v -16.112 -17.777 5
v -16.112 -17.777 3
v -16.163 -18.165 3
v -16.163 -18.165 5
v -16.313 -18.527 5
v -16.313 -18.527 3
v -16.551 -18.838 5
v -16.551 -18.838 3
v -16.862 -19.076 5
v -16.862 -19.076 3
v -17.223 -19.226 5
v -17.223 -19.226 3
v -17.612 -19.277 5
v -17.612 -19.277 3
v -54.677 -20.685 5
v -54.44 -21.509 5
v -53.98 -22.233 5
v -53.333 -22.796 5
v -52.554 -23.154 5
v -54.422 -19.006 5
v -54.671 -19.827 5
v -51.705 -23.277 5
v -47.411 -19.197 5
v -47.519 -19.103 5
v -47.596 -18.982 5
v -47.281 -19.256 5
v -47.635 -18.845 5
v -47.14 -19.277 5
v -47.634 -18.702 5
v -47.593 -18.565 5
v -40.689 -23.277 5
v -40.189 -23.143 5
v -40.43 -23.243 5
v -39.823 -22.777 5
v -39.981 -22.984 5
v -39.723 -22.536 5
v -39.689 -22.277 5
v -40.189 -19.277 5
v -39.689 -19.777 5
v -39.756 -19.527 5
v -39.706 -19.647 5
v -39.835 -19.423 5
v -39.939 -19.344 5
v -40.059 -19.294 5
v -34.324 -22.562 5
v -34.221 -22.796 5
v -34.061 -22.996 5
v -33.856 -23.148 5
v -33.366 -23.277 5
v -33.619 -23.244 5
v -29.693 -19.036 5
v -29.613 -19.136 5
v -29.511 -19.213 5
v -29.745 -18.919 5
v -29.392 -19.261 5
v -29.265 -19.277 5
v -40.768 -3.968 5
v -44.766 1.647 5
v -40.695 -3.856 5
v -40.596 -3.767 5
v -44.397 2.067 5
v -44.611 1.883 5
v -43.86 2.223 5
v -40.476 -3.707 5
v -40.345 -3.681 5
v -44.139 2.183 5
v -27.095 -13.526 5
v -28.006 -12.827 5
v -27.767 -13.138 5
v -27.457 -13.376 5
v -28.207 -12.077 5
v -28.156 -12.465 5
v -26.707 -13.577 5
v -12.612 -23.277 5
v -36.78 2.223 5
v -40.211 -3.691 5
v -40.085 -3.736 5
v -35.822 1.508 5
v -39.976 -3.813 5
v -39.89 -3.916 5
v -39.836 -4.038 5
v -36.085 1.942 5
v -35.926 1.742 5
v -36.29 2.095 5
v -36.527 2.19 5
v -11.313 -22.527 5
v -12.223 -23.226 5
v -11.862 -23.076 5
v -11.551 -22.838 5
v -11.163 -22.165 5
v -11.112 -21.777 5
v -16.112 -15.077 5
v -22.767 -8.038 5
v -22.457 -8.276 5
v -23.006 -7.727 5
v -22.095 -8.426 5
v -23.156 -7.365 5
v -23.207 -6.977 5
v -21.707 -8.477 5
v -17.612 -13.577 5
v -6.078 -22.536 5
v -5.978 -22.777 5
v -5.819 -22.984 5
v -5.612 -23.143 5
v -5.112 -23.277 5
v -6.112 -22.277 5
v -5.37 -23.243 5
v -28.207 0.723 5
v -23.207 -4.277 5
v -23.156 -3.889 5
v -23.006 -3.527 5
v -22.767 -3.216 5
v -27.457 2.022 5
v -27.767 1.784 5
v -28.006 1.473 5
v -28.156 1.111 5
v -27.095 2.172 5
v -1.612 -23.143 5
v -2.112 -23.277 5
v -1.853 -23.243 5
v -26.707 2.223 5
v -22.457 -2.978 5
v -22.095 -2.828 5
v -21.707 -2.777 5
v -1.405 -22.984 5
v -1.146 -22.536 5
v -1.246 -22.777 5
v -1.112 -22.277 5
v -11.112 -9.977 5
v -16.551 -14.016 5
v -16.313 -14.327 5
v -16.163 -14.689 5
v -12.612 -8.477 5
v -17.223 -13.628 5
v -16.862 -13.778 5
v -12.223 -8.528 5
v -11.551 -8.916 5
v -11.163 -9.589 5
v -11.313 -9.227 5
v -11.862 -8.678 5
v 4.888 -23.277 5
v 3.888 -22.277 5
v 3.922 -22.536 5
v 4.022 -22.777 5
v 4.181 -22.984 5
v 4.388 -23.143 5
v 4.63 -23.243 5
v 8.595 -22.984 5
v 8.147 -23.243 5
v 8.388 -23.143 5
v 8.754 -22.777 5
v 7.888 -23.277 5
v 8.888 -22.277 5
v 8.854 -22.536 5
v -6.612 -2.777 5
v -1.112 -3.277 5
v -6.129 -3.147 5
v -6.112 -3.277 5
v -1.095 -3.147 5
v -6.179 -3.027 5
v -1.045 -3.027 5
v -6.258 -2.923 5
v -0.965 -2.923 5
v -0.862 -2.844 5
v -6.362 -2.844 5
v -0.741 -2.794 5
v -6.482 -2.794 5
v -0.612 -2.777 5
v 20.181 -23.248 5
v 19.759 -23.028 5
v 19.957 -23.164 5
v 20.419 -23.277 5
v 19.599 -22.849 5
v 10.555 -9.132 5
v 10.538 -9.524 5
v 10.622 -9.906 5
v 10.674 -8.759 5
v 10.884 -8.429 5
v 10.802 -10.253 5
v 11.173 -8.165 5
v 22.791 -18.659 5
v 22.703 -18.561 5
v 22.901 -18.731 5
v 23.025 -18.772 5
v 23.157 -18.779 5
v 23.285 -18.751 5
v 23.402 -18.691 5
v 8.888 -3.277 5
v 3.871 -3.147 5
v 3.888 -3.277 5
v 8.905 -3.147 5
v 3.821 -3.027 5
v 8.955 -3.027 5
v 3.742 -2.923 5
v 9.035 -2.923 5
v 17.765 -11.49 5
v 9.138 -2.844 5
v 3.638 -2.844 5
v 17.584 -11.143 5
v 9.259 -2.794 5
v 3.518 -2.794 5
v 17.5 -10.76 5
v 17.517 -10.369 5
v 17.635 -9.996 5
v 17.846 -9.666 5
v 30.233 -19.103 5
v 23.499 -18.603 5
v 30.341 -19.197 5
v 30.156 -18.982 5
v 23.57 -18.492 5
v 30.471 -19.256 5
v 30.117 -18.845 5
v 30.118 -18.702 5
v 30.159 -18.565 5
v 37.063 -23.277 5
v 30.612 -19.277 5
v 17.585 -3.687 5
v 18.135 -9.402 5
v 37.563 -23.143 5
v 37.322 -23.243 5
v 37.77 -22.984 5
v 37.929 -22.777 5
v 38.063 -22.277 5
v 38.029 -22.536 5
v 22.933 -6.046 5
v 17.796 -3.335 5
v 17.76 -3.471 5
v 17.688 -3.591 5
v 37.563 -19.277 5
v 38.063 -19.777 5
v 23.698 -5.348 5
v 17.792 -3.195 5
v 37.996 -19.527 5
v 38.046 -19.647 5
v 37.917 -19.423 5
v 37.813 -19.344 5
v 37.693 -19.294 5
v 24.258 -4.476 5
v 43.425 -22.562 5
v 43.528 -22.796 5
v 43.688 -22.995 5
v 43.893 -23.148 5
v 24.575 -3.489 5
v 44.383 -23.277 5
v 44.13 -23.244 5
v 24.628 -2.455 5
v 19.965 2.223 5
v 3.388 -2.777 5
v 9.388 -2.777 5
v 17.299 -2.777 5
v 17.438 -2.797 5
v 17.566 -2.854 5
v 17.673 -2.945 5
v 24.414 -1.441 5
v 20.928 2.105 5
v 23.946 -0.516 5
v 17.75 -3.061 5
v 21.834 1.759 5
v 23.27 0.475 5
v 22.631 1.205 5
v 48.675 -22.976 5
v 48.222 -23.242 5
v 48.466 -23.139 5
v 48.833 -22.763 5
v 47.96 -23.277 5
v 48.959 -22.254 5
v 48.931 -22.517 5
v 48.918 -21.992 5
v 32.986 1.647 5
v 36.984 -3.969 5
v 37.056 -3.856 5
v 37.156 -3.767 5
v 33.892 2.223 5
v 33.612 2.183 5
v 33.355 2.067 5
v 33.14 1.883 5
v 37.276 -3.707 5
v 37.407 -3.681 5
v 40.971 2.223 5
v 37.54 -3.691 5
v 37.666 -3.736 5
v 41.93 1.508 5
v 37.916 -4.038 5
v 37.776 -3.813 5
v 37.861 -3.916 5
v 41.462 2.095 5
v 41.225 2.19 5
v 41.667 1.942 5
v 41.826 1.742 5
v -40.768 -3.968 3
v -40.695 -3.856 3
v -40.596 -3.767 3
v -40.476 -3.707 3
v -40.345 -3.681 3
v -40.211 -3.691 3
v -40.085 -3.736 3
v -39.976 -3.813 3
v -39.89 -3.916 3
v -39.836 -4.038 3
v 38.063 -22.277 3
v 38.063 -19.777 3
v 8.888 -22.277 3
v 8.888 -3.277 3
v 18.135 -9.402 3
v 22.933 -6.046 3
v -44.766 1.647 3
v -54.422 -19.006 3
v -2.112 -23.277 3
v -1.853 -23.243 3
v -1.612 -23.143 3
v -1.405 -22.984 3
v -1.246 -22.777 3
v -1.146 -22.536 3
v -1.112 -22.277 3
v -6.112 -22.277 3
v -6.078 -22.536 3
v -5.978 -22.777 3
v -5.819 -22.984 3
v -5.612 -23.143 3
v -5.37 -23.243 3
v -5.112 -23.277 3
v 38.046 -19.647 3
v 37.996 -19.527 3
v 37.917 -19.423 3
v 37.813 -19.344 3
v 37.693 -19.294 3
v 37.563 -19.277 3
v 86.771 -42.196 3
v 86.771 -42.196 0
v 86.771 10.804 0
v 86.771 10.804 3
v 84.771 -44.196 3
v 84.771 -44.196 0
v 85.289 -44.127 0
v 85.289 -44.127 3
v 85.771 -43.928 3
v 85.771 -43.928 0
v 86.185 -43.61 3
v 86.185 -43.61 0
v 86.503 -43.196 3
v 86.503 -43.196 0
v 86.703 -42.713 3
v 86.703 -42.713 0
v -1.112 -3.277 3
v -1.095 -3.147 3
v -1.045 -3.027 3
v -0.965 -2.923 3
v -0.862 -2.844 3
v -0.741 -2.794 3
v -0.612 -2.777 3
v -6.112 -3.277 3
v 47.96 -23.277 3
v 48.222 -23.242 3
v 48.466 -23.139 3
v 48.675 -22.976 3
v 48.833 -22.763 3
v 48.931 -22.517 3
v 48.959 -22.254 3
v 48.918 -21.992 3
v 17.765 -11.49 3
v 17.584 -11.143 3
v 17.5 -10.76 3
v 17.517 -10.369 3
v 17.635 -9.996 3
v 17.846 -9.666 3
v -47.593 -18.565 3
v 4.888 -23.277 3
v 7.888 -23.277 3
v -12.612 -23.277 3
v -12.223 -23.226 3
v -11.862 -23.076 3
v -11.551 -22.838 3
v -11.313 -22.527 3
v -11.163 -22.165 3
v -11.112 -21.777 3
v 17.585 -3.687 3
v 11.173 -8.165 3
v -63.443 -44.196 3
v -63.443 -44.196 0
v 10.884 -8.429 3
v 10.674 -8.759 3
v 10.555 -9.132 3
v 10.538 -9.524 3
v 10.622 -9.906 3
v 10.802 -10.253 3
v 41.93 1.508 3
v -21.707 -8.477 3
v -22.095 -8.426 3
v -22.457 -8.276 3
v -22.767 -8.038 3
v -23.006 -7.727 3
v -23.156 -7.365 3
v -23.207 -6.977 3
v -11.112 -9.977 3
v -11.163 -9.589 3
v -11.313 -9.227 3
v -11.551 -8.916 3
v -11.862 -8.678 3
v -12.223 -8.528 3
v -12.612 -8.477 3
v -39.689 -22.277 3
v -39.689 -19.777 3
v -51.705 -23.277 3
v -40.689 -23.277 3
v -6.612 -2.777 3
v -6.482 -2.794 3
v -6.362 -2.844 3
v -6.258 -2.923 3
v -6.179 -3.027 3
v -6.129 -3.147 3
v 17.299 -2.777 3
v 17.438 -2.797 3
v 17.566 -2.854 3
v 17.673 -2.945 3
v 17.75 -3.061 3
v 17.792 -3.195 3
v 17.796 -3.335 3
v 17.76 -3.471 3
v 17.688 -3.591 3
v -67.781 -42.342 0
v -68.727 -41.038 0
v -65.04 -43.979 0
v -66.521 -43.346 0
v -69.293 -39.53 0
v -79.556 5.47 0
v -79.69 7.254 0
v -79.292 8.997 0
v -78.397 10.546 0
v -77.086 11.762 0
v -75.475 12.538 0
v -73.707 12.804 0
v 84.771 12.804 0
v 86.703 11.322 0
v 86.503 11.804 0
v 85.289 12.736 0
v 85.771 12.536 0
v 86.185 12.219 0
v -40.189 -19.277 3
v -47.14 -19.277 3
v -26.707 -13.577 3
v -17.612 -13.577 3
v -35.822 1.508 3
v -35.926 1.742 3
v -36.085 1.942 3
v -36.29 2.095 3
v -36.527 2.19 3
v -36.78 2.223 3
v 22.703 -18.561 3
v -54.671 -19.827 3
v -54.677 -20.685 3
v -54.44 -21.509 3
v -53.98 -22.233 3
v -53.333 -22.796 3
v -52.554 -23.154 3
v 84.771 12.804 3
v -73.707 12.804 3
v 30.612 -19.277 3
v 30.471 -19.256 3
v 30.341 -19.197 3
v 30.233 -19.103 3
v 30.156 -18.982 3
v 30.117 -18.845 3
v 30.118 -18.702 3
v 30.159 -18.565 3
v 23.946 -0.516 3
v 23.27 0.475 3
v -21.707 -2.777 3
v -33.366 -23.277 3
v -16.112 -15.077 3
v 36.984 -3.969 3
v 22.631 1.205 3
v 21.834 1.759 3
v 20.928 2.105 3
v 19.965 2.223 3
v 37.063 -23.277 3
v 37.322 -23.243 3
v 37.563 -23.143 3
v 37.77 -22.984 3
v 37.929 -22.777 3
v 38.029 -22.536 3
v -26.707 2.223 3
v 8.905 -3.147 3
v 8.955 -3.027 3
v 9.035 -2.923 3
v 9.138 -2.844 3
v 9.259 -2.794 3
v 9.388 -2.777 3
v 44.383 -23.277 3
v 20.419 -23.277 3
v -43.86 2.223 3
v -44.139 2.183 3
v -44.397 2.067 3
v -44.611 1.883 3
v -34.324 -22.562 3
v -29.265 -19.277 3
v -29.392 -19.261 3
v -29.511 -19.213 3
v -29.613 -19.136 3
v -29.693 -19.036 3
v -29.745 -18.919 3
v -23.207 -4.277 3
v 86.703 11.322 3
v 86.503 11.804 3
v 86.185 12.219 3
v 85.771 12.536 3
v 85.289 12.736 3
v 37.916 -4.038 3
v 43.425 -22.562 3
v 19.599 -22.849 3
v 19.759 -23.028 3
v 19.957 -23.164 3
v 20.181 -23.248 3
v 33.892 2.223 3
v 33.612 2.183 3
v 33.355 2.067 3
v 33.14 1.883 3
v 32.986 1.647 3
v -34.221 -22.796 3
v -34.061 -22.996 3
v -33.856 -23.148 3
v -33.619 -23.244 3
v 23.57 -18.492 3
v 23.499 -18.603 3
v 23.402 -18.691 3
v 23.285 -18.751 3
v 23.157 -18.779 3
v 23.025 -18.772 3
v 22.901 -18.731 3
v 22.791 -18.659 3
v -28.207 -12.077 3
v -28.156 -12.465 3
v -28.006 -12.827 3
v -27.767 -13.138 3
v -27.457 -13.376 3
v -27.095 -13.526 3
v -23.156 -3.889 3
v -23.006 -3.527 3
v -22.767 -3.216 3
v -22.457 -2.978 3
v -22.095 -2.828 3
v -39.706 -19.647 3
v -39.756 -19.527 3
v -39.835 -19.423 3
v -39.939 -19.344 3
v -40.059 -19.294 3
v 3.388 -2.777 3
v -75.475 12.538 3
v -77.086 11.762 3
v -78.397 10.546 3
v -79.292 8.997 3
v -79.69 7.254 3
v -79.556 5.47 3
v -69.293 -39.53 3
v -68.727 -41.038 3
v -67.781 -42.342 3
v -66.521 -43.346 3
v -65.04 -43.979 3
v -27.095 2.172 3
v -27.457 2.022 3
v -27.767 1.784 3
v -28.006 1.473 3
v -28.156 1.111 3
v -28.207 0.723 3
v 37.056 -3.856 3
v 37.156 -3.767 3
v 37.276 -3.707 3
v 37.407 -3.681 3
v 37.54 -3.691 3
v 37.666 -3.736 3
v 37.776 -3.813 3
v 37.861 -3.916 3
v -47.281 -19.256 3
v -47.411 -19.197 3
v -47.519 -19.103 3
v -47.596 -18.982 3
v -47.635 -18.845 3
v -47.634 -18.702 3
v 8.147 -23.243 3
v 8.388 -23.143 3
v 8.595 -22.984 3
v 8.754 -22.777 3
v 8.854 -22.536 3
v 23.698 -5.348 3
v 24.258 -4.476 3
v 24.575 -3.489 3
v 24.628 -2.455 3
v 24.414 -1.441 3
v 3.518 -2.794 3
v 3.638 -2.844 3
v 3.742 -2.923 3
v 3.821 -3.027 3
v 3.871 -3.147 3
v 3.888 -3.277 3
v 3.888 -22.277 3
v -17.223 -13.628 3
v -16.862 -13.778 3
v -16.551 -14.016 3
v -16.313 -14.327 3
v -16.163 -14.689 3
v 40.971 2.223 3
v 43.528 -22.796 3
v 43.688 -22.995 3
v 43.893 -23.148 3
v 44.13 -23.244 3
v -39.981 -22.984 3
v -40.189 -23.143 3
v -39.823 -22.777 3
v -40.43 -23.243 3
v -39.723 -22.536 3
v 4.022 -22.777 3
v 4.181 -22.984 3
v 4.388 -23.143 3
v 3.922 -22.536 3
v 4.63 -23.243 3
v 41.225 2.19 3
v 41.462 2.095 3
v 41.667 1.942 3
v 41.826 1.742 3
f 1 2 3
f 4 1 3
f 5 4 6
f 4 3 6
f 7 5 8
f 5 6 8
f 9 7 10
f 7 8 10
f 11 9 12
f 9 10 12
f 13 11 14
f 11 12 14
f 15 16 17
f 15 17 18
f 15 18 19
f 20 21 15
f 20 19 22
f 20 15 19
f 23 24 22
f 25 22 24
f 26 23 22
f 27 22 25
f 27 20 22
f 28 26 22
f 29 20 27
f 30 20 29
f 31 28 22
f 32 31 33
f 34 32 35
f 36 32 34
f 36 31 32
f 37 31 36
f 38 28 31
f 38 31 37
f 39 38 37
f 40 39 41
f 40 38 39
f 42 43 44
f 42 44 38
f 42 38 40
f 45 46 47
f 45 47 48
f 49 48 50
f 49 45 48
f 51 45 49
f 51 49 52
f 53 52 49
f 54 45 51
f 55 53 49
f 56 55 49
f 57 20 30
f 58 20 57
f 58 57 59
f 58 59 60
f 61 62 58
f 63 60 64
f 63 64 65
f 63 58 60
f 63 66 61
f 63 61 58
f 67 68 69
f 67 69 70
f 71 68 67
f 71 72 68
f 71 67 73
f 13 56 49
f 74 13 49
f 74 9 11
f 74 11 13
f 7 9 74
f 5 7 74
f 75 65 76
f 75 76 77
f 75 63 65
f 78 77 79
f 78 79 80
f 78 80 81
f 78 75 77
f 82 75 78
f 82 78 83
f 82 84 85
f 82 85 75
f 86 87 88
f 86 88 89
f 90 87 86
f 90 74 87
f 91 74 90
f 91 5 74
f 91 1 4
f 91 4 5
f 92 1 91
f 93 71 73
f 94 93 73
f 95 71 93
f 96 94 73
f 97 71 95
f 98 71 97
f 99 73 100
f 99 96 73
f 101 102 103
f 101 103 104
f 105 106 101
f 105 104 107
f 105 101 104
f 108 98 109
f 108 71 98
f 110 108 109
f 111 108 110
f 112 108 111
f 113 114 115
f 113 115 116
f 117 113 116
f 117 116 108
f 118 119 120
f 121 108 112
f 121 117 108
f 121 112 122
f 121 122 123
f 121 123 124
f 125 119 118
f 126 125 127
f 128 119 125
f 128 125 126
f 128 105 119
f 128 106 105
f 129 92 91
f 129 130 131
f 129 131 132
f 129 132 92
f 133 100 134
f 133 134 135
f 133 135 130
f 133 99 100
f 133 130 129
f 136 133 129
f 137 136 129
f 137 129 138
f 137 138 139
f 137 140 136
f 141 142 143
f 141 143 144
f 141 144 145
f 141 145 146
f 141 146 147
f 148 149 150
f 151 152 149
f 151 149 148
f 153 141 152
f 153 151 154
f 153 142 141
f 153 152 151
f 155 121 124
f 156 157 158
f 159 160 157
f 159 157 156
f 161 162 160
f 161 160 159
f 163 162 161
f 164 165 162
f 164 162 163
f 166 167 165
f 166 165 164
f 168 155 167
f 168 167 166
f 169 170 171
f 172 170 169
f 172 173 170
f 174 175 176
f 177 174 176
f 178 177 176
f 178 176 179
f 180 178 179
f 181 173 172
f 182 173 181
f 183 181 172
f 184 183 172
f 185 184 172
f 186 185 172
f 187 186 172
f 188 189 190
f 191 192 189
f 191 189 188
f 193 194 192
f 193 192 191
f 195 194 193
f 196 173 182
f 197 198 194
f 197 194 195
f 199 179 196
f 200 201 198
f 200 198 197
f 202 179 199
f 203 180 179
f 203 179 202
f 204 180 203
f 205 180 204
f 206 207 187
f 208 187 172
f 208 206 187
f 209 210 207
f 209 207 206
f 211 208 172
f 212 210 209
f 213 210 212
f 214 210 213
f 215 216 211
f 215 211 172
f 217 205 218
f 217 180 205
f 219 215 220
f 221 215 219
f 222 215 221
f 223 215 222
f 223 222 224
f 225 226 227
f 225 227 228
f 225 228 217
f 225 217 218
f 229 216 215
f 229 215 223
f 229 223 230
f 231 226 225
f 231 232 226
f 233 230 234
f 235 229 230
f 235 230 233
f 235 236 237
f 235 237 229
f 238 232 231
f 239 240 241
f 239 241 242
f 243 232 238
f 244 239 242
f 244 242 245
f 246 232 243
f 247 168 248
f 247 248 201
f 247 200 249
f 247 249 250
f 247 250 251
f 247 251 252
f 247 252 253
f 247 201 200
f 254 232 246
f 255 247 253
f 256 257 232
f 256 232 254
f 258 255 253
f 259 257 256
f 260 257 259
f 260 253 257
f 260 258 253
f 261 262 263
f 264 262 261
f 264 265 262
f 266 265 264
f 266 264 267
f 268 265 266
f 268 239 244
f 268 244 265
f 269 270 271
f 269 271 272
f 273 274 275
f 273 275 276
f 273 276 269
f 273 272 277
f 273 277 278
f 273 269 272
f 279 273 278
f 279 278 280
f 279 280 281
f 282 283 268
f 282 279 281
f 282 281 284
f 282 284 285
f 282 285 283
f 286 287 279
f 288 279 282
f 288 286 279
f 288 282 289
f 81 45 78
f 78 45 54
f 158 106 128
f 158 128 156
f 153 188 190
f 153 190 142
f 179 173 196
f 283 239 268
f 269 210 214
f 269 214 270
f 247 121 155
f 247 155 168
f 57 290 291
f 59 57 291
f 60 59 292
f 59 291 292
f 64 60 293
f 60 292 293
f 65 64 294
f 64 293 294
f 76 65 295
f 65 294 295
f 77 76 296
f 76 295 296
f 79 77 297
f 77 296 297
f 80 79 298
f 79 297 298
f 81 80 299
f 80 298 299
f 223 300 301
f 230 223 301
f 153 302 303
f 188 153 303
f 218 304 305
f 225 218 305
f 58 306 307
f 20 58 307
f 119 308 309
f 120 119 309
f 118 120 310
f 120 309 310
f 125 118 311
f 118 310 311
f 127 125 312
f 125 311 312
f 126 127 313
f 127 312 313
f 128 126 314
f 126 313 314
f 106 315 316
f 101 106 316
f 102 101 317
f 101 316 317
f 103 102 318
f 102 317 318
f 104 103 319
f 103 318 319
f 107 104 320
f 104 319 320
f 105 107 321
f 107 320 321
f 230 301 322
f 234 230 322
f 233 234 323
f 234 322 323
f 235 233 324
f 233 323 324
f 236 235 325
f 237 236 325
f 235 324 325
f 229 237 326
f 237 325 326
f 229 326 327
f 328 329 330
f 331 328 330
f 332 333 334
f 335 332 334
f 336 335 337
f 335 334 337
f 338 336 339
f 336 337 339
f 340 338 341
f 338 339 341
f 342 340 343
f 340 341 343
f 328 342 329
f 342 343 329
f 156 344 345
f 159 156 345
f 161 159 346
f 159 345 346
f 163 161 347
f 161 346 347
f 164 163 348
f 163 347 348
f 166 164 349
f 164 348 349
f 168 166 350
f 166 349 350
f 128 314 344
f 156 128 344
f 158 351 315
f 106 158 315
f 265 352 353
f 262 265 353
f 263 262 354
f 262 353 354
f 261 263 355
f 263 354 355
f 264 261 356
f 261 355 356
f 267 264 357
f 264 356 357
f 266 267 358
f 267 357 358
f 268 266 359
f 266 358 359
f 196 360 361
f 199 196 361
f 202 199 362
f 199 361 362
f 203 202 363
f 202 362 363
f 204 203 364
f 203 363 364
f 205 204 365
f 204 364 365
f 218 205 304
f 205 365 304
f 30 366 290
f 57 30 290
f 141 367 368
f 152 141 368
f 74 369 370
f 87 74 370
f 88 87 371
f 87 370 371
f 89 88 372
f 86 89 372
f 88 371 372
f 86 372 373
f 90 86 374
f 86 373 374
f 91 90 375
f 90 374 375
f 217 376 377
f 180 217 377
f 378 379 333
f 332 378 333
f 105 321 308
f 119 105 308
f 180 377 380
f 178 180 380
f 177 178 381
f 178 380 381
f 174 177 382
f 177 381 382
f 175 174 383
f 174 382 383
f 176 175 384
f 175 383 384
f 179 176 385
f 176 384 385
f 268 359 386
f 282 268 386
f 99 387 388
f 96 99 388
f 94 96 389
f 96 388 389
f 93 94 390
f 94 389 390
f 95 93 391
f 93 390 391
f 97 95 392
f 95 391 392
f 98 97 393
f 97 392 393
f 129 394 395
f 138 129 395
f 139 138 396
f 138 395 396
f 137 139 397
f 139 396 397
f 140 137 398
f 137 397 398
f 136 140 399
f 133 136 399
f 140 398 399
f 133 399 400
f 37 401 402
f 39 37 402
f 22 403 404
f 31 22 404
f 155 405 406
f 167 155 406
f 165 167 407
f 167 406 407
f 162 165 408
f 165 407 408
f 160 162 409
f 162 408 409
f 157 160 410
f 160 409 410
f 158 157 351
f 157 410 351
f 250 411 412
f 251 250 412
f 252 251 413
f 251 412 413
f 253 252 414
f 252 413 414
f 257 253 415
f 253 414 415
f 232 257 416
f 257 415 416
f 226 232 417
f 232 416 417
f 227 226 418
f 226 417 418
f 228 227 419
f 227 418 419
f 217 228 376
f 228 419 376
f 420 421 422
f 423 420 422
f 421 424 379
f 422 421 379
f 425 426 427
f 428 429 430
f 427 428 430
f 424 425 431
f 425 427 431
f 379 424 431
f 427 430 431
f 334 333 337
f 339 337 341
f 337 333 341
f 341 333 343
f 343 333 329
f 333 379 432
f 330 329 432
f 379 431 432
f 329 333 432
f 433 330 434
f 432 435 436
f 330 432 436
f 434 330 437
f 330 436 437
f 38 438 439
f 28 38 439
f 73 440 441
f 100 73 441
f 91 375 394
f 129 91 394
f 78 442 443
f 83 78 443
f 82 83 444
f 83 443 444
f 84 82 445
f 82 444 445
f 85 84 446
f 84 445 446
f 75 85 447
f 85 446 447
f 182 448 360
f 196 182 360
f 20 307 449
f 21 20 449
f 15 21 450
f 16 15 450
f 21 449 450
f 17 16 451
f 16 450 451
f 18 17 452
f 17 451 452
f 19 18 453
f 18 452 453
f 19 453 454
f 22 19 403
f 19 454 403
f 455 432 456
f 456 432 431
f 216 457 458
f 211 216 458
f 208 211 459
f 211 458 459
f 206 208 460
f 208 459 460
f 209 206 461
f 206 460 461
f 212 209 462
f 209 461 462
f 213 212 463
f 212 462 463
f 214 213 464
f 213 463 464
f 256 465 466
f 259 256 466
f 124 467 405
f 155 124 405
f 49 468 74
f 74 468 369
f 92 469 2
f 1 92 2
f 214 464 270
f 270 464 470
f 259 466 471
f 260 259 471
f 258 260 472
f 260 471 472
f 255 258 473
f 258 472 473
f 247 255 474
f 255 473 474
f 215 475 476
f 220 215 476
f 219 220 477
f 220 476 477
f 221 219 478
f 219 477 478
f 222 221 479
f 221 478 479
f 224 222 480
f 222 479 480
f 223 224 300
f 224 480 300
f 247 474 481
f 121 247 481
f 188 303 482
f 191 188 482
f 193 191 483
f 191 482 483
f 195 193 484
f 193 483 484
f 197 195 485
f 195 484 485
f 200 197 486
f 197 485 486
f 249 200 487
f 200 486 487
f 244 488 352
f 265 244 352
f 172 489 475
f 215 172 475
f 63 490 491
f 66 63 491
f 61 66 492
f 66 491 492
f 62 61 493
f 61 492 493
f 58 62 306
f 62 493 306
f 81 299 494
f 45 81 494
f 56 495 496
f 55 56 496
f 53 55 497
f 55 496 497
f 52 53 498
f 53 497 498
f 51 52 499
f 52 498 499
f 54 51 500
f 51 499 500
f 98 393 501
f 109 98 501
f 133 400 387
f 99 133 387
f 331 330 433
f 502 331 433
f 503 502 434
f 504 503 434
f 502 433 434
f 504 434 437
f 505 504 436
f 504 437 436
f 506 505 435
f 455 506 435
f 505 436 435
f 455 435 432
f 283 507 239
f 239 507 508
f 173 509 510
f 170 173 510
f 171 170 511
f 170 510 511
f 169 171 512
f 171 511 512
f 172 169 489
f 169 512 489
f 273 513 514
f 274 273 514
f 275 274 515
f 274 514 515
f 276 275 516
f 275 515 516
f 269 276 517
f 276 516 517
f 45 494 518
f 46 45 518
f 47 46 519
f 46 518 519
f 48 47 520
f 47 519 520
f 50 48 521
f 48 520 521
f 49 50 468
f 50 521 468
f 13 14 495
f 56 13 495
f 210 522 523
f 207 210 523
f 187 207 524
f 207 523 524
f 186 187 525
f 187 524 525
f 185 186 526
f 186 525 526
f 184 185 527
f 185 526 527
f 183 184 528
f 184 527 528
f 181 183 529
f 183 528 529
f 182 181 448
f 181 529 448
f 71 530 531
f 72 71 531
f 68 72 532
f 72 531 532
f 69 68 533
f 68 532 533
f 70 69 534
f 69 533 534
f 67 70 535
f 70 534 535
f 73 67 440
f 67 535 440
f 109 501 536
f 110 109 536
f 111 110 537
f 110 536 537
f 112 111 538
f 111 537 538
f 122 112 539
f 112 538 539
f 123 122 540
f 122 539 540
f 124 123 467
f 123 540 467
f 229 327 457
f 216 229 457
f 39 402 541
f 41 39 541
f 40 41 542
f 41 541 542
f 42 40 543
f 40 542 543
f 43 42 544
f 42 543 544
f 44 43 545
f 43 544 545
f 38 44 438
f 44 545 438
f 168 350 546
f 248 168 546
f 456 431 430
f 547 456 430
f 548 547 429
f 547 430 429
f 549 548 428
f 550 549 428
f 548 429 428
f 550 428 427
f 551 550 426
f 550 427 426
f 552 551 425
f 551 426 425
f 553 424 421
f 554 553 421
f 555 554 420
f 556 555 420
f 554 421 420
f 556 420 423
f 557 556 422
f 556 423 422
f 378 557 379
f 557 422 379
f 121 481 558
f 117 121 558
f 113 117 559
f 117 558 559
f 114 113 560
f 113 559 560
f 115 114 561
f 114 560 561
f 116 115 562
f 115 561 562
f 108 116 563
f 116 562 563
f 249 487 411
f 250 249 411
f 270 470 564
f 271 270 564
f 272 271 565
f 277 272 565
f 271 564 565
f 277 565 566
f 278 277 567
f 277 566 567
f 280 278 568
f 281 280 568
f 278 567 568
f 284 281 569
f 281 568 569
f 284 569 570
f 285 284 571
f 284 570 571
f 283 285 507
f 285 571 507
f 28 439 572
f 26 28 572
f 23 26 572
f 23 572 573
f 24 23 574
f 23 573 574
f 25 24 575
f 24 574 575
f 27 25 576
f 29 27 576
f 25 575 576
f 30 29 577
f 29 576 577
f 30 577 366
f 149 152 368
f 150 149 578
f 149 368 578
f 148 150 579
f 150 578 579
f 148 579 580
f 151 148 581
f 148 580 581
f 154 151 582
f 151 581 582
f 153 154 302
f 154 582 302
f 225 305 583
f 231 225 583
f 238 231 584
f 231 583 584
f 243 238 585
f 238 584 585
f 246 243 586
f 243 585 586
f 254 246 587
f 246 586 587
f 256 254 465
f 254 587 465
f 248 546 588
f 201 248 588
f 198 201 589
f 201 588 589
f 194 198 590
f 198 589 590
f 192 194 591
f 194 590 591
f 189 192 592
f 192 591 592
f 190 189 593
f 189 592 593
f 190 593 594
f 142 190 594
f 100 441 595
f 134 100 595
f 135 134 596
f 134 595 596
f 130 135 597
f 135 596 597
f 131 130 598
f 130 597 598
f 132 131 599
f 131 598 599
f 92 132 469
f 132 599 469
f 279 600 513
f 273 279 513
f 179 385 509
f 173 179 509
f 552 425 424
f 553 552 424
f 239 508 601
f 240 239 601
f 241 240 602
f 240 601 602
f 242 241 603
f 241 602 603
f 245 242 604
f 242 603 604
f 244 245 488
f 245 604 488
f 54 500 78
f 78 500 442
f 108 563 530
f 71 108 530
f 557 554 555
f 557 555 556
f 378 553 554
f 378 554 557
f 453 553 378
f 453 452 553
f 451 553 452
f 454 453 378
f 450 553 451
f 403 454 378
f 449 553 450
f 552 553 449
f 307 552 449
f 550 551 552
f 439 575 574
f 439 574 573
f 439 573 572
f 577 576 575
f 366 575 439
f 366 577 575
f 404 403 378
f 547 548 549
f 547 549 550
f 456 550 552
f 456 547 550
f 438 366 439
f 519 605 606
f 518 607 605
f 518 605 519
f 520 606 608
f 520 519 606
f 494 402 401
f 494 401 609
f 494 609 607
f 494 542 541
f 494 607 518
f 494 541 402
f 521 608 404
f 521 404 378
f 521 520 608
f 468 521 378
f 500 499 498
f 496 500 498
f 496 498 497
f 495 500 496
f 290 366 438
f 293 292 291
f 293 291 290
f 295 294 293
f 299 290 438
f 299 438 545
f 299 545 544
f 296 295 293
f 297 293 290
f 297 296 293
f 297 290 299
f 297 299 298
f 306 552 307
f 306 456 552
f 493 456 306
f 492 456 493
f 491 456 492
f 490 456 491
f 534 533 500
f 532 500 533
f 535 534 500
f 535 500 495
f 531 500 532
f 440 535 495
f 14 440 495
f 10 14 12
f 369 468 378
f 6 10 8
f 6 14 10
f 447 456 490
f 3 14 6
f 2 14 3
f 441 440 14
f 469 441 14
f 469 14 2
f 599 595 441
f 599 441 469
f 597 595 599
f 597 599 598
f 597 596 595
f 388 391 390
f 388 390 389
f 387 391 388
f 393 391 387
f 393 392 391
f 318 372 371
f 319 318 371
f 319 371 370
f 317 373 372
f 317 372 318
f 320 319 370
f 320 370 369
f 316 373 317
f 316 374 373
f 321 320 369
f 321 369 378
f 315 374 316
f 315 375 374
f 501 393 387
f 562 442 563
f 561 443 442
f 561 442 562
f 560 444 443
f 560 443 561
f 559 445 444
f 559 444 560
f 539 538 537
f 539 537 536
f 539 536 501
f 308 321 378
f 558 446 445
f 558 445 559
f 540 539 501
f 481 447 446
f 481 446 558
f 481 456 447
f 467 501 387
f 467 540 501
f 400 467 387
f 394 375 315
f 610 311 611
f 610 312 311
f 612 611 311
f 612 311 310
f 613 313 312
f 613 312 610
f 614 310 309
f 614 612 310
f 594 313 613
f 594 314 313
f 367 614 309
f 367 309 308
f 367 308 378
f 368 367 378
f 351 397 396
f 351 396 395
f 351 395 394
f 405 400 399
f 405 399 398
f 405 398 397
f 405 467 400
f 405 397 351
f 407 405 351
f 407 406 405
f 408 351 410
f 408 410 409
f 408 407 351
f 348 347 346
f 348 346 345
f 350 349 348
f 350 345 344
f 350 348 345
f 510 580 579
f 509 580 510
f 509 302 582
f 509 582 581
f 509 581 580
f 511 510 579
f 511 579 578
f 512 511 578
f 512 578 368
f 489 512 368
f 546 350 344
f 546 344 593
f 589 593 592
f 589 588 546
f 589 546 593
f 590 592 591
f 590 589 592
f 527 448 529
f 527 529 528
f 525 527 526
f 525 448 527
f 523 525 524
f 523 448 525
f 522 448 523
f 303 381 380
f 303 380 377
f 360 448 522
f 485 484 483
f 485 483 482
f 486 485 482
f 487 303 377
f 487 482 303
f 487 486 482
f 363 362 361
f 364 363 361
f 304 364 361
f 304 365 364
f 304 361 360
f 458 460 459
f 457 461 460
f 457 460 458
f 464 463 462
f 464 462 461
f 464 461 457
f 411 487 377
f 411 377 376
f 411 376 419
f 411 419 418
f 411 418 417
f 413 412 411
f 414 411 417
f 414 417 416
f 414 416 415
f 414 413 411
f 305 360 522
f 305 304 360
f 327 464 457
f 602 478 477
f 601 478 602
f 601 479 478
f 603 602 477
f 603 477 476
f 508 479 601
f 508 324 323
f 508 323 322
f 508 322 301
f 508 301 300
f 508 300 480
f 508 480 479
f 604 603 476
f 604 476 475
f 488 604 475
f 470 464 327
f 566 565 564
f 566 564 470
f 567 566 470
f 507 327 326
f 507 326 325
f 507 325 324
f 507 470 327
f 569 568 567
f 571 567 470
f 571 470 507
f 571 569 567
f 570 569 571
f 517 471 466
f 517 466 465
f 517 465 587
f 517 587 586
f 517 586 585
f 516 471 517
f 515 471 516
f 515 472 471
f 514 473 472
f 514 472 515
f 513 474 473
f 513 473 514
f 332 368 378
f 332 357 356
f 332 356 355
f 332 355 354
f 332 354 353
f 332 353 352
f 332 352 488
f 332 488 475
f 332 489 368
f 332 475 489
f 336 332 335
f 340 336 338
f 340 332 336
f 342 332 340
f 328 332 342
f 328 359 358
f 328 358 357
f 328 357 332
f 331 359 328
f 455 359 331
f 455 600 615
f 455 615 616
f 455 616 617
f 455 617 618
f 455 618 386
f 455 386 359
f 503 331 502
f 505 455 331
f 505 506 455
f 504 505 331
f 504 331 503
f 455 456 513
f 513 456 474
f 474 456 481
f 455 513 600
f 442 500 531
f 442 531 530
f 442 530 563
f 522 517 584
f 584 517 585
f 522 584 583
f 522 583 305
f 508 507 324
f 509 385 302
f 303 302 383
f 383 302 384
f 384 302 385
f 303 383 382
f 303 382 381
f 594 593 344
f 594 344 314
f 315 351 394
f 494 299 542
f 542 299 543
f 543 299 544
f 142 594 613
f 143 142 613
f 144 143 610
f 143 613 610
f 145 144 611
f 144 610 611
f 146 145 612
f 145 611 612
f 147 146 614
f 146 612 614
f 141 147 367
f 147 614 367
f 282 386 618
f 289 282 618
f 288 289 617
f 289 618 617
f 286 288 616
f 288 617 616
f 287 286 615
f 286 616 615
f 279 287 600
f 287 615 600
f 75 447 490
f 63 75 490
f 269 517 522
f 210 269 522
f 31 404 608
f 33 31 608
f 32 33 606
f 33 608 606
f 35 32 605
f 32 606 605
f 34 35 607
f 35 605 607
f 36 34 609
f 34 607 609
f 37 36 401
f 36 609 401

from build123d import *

# Parameters (mm, degrees)
F1_DEPTH = 3
F2_DEPTH = 5


with BuildPart() as f1:
    # F0 (on Top) → F1 (new body)
    with BuildSketch(Plane.XY):
        with BuildLine():
            Line((84.770986, 12.804396), (-73.706523, 12.804396))
            ThreePointArc((-73.706523, 12.804396), (-78.397204, 10.545721), (-79.55631, 5.470234))
            Line((-79.55631, 5.470234), (-69.293152, -39.529766))
            ThreePointArc((-69.293152, -39.529766), (-67.18469, -42.886285), (-63.443365, -44.195604))
            Line((-63.443365, -44.195604), (84.770986, -44.195604))
            ThreePointArc((84.770986, -44.195604), (86.1852, -43.609817), (86.770986, -42.195604))
            Line((86.770986, -42.195604), (86.770986, 10.804396))
            ThreePointArc((86.770986, 10.804396), (86.1852, 12.21861), (84.770986, 12.804396))
        make_face()
        with BuildLine():
            ThreePointArc((-51.704852, -23.276883), (-54.235863, -21.887469), (-54.422458, -19.006208))
            Line((-54.422458, -19.006208), (-44.765755, 1.646675))
            ThreePointArc((-44.765755, 1.646675), (-44.396748, 2.066787), (-43.859886, 2.223117))
            Line((-43.859886, 2.223117), (-36.780495, 2.223117))
            ThreePointArc((-36.780495, 2.223117), (-36.182648, 2.024727), (-35.822015, 1.508276))
            Line((-35.822015, 1.508276), (-29.744515, -18.919463))
            ThreePointArc((-29.744515, -18.919463), (-29.564199, -19.177689), (-29.265275, -19.276883))
            Line((-29.265275, -19.276883), (-17.611612, -19.276883))
            ThreePointArc((-17.611612, -19.276883), (-16.550951, -18.837544), (-16.111612, -17.776883))
            Line((-16.111612, -17.776883), (-16.111612, -15.076883))
            ThreePointArc((-16.111612, -15.076883), (-16.550951, -14.016223), (-17.611612, -13.576883))
            Line((-17.611612, -13.576883), (-26.706637, -13.576883))
            ThreePointArc((-26.706637, -13.576883), (-27.767297, -13.137544), (-28.206637, -12.076883))
            Line((-28.206637, -12.076883), (-28.206637, 0.723117))
            ThreePointArc((-28.206637, 0.723117), (-27.767297, 1.783777), (-26.706637, 2.223117))
            Line((-26.706637, 2.223117), (19.964748, 2.223117))
            ThreePointArc((19.964748, 2.223117), (21.83444, 1.759252), (23.27049, 0.475242))
            Line((23.27049, 0.475242), (23.946029, -0.516336))
            ThreePointArc((23.946029, -0.516336), (24.574778, -3.489419), (22.9327, -6.046394))
            Line((22.9327, -6.046394), (18.134728, -9.401842))
            ThreePointArc((18.134728, -9.401842), (17.517407, -10.369258), (17.764597, -11.489918))
            Line((17.764597, -11.489918), (22.703174, -18.561448))
            ThreePointArc((22.703174, -18.561448), (23.156561, -18.778873), (23.569687, -18.492236))
            Line((23.569687, -18.492236), (32.985871, 1.646668))
            ThreePointArc((32.985871, 1.646668), (33.354878, 2.066785), (33.891743, 2.223117))
            Line((33.891743, 2.223117), (40.97149, 2.223117))
            ThreePointArc((40.97149, 2.223117), (41.569388, 2.024689), (41.930007, 1.508153))
            Line((41.930007, 1.508153), (48.918247, -21.991847))
            ThreePointArc((48.918247, -21.991847), (48.761303, -22.874781), (47.95973, -23.276883))
            Line((47.95973, -23.276883), (44.38307, -23.276883))
            ThreePointArc((44.38307, -23.276883), (43.785172, -23.078456), (43.424553, -22.561919))
            Line((43.424553, -22.561919), (37.916023, -4.037877))
            ThreePointArc((37.916023, -4.037877), (37.47381, -3.681769), (36.983828, -3.968619))
            Line((36.983828, -3.968619), (30.159066, -18.565108))
            ThreePointArc((30.159066, -18.565108), (30.190168, -19.045316), (30.612002, -19.276883))
            Line((30.612002, -19.276883), (37.563267, -19.276883))
            ThreePointArc((37.563267, -19.276883), (37.91682, -19.42333), (38.063267, -19.776883))
            Line((38.063267, -19.776883), (38.063267, -22.276883))
            ThreePointArc((38.063267, -22.276883), (37.770374, -22.98399), (37.063267, -23.276883))
            Line((37.063267, -23.276883), (20.419043, -23.276883))
            ThreePointArc((20.419043, -23.276883), (19.956748, -23.16361), (19.599185, -22.849451))
            Line((19.599185, -22.849451), (10.802471, -10.253469))
            ThreePointArc((10.802471, -10.253469), (10.555368, -9.132327), (11.173406, -8.164831))
            Line((11.173406, -8.164831), (17.585465, -3.686812))
            ThreePointArc((17.585465, -3.686812), (17.776132, -3.126824), (17.299181, -2.776883))
            Line((17.299181, -2.776883), (9.388388, -2.776883))
            ThreePointArc((9.388388, -2.776883), (9.034835, -2.92333), (8.888388, -3.276883))
            Line((8.888388, -3.276883), (8.888388, -22.276883))
            ThreePointArc((8.888388, -22.276883), (8.595495, -22.98399), (7.888388, -23.276883))
            Line((7.888388, -23.276883), (4.888388, -23.276883))
            ThreePointArc((4.888388, -23.276883), (4.181282, -22.98399), (3.888388, -22.276883))
            Line((3.888388, -22.276883), (3.888388, -3.276883))
            ThreePointArc((3.888388, -3.276883), (3.741942, -2.92333), (3.388388, -2.776883))
            Line((3.388388, -2.776883), (-0.611612, -2.776883))
            ThreePointArc((-0.611612, -2.776883), (-0.965165, -2.92333), (-1.111612, -3.276883))
            Line((-1.111612, -3.276883), (-1.111612, -22.276883))
            ThreePointArc((-1.111612, -22.276883), (-1.404505, -22.98399), (-2.111612, -23.276883))
            Line((-2.111612, -23.276883), (-5.111612, -23.276883))
            ThreePointArc((-5.111612, -23.276883), (-5.818718, -22.98399), (-6.111612, -22.276883))
            Line((-6.111612, -22.276883), (-6.111612, -3.276883))
            ThreePointArc((-6.111612, -3.276883), (-6.258058, -2.92333), (-6.611612, -2.776883))
            Line((-6.611612, -2.776883), (-21.706637, -2.776883))
            ThreePointArc((-21.706637, -2.776883), (-22.767297, -3.216223), (-23.206637, -4.276883))
            Line((-23.206637, -4.276883), (-23.206637, -6.976883))
            ThreePointArc((-23.206637, -6.976883), (-22.767297, -8.037544), (-21.706637, -8.476883))
            Line((-21.706637, -8.476883), (-12.611612, -8.476883))
            ThreePointArc((-12.611612, -8.476883), (-11.550951, -8.916223), (-11.111612, -9.976883))
            Line((-11.111612, -9.976883), (-11.111612, -21.776883))
            ThreePointArc((-11.111612, -21.776883), (-11.550951, -22.837544), (-12.611612, -23.276883))
            Line((-12.611612, -23.276883), (-33.365805, -23.276883))
            ThreePointArc((-33.365805, -23.276883), (-33.963652, -23.078494), (-34.324285, -22.562043))
            Line((-34.324285, -22.562043), (-39.83554, -4.037569))
            ThreePointArc((-39.83554, -4.037569), (-40.277765, -3.681521), (-40.767714, -3.96837))
            Line((-40.767714, -3.96837), (-47.592734, -18.565104))
            ThreePointArc((-47.592734, -18.565104), (-47.561635, -19.045314), (-47.1398, -19.276883))
            Line((-47.1398, -19.276883), (-40.188535, -19.276883))
            ThreePointArc((-40.188535, -19.276883), (-39.834982, -19.42333), (-39.688535, -19.776883))
            Line((-39.688535, -19.776883), (-39.688535, -22.276883))
            ThreePointArc((-39.688535, -22.276883), (-39.981428, -22.98399), (-40.688535, -23.276883))
            Line((-40.688535, -23.276883), (-51.704852, -23.276883))
        make_face(mode=Mode.SUBTRACT)
    extrude(amount=F1_DEPTH)

    # F0 (on Top) → F2 (join)
    with BuildSketch(Plane.XY):
        with BuildLine():
            Line((-44.765755, 1.646675), (-54.422458, -19.006208))
            ThreePointArc((-54.422458, -19.006208), (-54.235863, -21.887469), (-51.704852, -23.276883))
            Line((-51.704852, -23.276883), (-40.688535, -23.276883))
            ThreePointArc((-40.688535, -23.276883), (-39.981428, -22.98399), (-39.688535, -22.276883))
            Line((-39.688535, -22.276883), (-39.688535, -19.776883))
            ThreePointArc((-39.688535, -19.776883), (-39.834982, -19.42333), (-40.188535, -19.276883))
            Line((-40.188535, -19.276883), (-47.1398, -19.276883))
            ThreePointArc((-47.1398, -19.276883), (-47.561635, -19.045314), (-47.592734, -18.565104))
            Line((-47.592734, -18.565104), (-40.767714, -3.96837))
            ThreePointArc((-40.767714, -3.96837), (-40.277765, -3.681521), (-39.83554, -4.037569))
            Line((-39.83554, -4.037569), (-34.324285, -22.562043))
            ThreePointArc((-34.324285, -22.562043), (-33.963652, -23.078494), (-33.365805, -23.276883))
            Line((-33.365805, -23.276883), (-12.611612, -23.276883))
            ThreePointArc((-12.611612, -23.276883), (-11.550951, -22.837544), (-11.111612, -21.776883))
            Line((-11.111612, -21.776883), (-11.111612, -9.976883))
            ThreePointArc((-11.111612, -9.976883), (-11.550951, -8.916223), (-12.611612, -8.476883))
            Line((-12.611612, -8.476883), (-21.706637, -8.476883))
            ThreePointArc((-21.706637, -8.476883), (-22.767297, -8.037544), (-23.206637, -6.976883))
            Line((-23.206637, -6.976883), (-23.206637, -4.276883))
            ThreePointArc((-23.206637, -4.276883), (-22.767297, -3.216223), (-21.706637, -2.776883))
            Line((-21.706637, -2.776883), (-6.611612, -2.776883))
            ThreePointArc((-6.611612, -2.776883), (-6.258058, -2.92333), (-6.111612, -3.276883))
            Line((-6.111612, -3.276883), (-6.111612, -22.276883))
            ThreePointArc((-6.111612, -22.276883), (-5.818718, -22.98399), (-5.111612, -23.276883))
            Line((-5.111612, -23.276883), (-2.111612, -23.276883))
            ThreePointArc((-2.111612, -23.276883), (-1.404505, -22.98399), (-1.111612, -22.276883))
            Line((-1.111612, -22.276883), (-1.111612, -3.276883))
            ThreePointArc((-1.111612, -3.276883), (-0.965165, -2.92333), (-0.611612, -2.776883))
            Line((-0.611612, -2.776883), (3.388388, -2.776883))
            ThreePointArc((3.388388, -2.776883), (3.741942, -2.92333), (3.888388, -3.276883))
            Line((3.888388, -3.276883), (3.888388, -22.276883))
            ThreePointArc((3.888388, -22.276883), (4.181282, -22.98399), (4.888388, -23.276883))
            Line((4.888388, -23.276883), (7.888388, -23.276883))
            ThreePointArc((7.888388, -23.276883), (8.595495, -22.98399), (8.888388, -22.276883))
            Line((8.888388, -22.276883), (8.888388, -3.276883))
            ThreePointArc((8.888388, -3.276883), (9.034835, -2.92333), (9.388388, -2.776883))
            Line((9.388388, -2.776883), (17.299181, -2.776883))
            ThreePointArc((17.299181, -2.776883), (17.776132, -3.126824), (17.585465, -3.686812))
            Line((17.585465, -3.686812), (11.173406, -8.164831))
            ThreePointArc((11.173406, -8.164831), (10.555368, -9.132327), (10.802471, -10.253469))
            Line((10.802471, -10.253469), (19.599185, -22.849451))
            ThreePointArc((19.599185, -22.849451), (19.956748, -23.16361), (20.419043, -23.276883))
            Line((20.419043, -23.276883), (37.063267, -23.276883))
            ThreePointArc((37.063267, -23.276883), (37.770374, -22.98399), (38.063267, -22.276883))
            Line((38.063267, -22.276883), (38.063267, -19.776883))
            ThreePointArc((38.063267, -19.776883), (37.91682, -19.42333), (37.563267, -19.276883))
            Line((37.563267, -19.276883), (30.612002, -19.276883))
            ThreePointArc((30.612002, -19.276883), (30.190168, -19.045316), (30.159066, -18.565108))
            Line((30.159066, -18.565108), (36.983828, -3.968619))
            ThreePointArc((36.983828, -3.968619), (37.47381, -3.681769), (37.916023, -4.037877))
            Line((37.916023, -4.037877), (43.424553, -22.561919))
            ThreePointArc((43.424553, -22.561919), (43.785172, -23.078456), (44.38307, -23.276883))
            Line((44.38307, -23.276883), (47.95973, -23.276883))
            ThreePointArc((47.95973, -23.276883), (48.761303, -22.874781), (48.918247, -21.991847))
            Line((48.918247, -21.991847), (41.930007, 1.508153))
            ThreePointArc((41.930007, 1.508153), (41.569388, 2.024689), (40.97149, 2.223117))
            Line((40.97149, 2.223117), (33.891743, 2.223117))
            ThreePointArc((33.891743, 2.223117), (33.354878, 2.066785), (32.985871, 1.646668))
            Line((32.985871, 1.646668), (23.569687, -18.492236))
            ThreePointArc((23.569687, -18.492236), (23.156561, -18.778873), (22.703174, -18.561448))
            Line((22.703174, -18.561448), (17.764597, -11.489918))
            ThreePointArc((17.764597, -11.489918), (17.517407, -10.369258), (18.134728, -9.401842))
            Line((18.134728, -9.401842), (22.9327, -6.046394))
            ThreePointArc((22.9327, -6.046394), (24.574778, -3.489419), (23.946029, -0.516336))
            Line((23.946029, -0.516336), (23.27049, 0.475242))
            ThreePointArc((23.27049, 0.475242), (21.83444, 1.759252), (19.964748, 2.223117))
            Line((19.964748, 2.223117), (-26.706637, 2.223117))
            ThreePointArc((-26.706637, 2.223117), (-27.767297, 1.783777), (-28.206637, 0.723117))
            Line((-28.206637, 0.723117), (-28.206637, -12.076883))
            ThreePointArc((-28.206637, -12.076883), (-27.767297, -13.137544), (-26.706637, -13.576883))
            Line((-26.706637, -13.576883), (-17.611612, -13.576883))
            ThreePointArc((-17.611612, -13.576883), (-16.550951, -14.016223), (-16.111612, -15.076883))
            Line((-16.111612, -15.076883), (-16.111612, -17.776883))
            ThreePointArc((-16.111612, -17.776883), (-16.550951, -18.837544), (-17.611612, -19.276883))
            Line((-17.611612, -19.276883), (-29.265275, -19.276883))
            ThreePointArc((-29.265275, -19.276883), (-29.564199, -19.177689), (-29.744515, -18.919463))
            Line((-29.744515, -18.919463), (-35.822015, 1.508276))
            ThreePointArc((-35.822015, 1.508276), (-36.182648, 2.024727), (-36.780495, 2.223117))
            Line((-36.780495, 2.223117), (-43.859886, 2.223117))
            ThreePointArc((-43.859886, 2.223117), (-44.396748, 2.066787), (-44.765755, 1.646675))
        make_face()
    extrude(amount=F2_DEPTH)


solid = f1.part
